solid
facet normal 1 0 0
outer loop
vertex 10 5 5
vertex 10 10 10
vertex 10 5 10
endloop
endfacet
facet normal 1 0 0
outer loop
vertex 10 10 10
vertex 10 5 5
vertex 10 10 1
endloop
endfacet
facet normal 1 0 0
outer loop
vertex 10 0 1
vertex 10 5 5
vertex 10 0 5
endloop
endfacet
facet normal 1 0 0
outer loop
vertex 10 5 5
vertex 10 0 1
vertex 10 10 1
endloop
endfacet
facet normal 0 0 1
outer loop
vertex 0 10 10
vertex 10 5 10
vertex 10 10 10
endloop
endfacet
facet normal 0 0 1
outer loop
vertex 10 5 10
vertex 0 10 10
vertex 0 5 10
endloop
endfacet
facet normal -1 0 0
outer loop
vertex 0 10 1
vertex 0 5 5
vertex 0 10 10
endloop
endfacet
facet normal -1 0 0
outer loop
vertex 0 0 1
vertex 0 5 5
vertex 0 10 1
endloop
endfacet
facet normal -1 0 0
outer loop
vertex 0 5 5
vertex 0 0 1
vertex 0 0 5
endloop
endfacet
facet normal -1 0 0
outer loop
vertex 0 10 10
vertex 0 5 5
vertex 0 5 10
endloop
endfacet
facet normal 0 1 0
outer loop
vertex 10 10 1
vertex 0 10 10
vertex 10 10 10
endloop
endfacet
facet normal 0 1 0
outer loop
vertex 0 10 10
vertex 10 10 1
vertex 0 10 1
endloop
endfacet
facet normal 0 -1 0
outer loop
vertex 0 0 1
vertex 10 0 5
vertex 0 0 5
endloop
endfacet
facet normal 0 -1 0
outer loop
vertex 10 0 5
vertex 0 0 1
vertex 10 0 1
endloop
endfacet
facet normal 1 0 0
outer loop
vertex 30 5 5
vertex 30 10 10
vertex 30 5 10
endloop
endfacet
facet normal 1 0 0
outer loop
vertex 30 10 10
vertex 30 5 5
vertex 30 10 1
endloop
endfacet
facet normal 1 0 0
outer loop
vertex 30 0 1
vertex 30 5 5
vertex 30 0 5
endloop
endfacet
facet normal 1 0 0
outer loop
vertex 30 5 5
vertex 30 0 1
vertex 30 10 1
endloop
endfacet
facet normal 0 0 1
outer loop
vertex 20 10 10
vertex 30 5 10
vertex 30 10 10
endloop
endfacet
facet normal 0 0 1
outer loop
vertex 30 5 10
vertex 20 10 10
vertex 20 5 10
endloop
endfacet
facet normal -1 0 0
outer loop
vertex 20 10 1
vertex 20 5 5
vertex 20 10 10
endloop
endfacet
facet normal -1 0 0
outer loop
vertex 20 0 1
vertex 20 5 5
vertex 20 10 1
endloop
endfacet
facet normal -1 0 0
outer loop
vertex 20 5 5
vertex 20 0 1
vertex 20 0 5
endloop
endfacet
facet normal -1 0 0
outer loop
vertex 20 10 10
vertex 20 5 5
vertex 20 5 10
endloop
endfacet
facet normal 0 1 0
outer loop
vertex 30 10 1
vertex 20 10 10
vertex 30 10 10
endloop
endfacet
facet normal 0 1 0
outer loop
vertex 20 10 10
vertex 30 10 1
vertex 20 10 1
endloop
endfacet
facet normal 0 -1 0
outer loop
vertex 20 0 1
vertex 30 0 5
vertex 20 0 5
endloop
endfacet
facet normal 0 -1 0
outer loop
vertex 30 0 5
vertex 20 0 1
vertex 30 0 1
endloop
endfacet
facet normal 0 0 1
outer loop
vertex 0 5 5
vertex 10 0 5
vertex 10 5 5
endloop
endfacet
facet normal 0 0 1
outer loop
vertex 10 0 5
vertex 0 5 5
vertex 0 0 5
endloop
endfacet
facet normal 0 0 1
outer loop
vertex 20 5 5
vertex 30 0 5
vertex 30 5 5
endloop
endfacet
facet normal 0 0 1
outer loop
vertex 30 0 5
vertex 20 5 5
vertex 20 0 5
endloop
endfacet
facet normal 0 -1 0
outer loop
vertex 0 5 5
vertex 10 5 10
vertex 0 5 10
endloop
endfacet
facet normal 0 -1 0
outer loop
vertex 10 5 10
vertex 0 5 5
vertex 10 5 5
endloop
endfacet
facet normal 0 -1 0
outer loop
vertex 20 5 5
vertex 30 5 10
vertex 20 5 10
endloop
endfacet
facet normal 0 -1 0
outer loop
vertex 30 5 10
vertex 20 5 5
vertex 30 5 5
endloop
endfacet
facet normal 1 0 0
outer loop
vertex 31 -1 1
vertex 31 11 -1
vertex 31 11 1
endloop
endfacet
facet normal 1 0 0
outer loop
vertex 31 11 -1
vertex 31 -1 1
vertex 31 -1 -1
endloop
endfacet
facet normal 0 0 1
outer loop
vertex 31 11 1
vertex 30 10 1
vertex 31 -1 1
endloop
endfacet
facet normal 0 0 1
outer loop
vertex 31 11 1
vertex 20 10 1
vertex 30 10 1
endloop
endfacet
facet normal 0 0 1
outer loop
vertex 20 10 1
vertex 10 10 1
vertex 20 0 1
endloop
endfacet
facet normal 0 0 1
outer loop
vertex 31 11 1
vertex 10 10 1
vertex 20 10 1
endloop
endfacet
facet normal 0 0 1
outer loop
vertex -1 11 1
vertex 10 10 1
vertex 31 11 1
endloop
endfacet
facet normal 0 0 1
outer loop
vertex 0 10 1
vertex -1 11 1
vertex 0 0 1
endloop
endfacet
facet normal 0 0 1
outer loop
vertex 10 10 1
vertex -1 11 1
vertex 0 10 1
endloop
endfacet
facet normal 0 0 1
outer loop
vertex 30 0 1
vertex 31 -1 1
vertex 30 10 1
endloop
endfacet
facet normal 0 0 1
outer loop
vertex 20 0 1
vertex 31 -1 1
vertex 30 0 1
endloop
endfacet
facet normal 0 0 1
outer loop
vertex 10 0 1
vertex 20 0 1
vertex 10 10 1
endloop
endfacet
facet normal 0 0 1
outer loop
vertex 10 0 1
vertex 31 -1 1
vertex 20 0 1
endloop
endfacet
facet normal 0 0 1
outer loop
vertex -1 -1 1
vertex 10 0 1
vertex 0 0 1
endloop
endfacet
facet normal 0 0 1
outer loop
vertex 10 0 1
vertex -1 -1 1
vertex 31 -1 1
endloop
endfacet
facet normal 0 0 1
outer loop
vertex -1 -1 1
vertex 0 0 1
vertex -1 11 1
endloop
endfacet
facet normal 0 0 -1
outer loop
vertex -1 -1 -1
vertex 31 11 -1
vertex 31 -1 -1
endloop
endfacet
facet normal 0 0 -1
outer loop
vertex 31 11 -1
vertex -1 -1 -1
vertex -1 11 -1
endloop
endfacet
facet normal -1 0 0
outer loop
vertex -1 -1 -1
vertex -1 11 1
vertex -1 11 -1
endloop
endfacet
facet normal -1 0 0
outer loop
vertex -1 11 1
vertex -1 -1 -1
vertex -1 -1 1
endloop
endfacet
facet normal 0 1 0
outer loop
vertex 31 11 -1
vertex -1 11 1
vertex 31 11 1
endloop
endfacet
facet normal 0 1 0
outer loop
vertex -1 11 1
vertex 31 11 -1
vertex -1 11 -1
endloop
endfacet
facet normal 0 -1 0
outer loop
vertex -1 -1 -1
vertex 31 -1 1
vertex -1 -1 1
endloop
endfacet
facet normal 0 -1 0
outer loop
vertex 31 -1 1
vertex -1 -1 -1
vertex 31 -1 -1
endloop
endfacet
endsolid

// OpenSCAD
// Volume: 2068, SurfaceArea: 1564
render() difference() {
  union() {
    color("red") cube(10);
    color("green") translate([20,0,0]) cube(10);
  }
  color("blue") translate([-1,-5,5]) cube([32,10,10]);
}
color("purple") translate([-1,-1,-1]) cube([32,12,2]);
